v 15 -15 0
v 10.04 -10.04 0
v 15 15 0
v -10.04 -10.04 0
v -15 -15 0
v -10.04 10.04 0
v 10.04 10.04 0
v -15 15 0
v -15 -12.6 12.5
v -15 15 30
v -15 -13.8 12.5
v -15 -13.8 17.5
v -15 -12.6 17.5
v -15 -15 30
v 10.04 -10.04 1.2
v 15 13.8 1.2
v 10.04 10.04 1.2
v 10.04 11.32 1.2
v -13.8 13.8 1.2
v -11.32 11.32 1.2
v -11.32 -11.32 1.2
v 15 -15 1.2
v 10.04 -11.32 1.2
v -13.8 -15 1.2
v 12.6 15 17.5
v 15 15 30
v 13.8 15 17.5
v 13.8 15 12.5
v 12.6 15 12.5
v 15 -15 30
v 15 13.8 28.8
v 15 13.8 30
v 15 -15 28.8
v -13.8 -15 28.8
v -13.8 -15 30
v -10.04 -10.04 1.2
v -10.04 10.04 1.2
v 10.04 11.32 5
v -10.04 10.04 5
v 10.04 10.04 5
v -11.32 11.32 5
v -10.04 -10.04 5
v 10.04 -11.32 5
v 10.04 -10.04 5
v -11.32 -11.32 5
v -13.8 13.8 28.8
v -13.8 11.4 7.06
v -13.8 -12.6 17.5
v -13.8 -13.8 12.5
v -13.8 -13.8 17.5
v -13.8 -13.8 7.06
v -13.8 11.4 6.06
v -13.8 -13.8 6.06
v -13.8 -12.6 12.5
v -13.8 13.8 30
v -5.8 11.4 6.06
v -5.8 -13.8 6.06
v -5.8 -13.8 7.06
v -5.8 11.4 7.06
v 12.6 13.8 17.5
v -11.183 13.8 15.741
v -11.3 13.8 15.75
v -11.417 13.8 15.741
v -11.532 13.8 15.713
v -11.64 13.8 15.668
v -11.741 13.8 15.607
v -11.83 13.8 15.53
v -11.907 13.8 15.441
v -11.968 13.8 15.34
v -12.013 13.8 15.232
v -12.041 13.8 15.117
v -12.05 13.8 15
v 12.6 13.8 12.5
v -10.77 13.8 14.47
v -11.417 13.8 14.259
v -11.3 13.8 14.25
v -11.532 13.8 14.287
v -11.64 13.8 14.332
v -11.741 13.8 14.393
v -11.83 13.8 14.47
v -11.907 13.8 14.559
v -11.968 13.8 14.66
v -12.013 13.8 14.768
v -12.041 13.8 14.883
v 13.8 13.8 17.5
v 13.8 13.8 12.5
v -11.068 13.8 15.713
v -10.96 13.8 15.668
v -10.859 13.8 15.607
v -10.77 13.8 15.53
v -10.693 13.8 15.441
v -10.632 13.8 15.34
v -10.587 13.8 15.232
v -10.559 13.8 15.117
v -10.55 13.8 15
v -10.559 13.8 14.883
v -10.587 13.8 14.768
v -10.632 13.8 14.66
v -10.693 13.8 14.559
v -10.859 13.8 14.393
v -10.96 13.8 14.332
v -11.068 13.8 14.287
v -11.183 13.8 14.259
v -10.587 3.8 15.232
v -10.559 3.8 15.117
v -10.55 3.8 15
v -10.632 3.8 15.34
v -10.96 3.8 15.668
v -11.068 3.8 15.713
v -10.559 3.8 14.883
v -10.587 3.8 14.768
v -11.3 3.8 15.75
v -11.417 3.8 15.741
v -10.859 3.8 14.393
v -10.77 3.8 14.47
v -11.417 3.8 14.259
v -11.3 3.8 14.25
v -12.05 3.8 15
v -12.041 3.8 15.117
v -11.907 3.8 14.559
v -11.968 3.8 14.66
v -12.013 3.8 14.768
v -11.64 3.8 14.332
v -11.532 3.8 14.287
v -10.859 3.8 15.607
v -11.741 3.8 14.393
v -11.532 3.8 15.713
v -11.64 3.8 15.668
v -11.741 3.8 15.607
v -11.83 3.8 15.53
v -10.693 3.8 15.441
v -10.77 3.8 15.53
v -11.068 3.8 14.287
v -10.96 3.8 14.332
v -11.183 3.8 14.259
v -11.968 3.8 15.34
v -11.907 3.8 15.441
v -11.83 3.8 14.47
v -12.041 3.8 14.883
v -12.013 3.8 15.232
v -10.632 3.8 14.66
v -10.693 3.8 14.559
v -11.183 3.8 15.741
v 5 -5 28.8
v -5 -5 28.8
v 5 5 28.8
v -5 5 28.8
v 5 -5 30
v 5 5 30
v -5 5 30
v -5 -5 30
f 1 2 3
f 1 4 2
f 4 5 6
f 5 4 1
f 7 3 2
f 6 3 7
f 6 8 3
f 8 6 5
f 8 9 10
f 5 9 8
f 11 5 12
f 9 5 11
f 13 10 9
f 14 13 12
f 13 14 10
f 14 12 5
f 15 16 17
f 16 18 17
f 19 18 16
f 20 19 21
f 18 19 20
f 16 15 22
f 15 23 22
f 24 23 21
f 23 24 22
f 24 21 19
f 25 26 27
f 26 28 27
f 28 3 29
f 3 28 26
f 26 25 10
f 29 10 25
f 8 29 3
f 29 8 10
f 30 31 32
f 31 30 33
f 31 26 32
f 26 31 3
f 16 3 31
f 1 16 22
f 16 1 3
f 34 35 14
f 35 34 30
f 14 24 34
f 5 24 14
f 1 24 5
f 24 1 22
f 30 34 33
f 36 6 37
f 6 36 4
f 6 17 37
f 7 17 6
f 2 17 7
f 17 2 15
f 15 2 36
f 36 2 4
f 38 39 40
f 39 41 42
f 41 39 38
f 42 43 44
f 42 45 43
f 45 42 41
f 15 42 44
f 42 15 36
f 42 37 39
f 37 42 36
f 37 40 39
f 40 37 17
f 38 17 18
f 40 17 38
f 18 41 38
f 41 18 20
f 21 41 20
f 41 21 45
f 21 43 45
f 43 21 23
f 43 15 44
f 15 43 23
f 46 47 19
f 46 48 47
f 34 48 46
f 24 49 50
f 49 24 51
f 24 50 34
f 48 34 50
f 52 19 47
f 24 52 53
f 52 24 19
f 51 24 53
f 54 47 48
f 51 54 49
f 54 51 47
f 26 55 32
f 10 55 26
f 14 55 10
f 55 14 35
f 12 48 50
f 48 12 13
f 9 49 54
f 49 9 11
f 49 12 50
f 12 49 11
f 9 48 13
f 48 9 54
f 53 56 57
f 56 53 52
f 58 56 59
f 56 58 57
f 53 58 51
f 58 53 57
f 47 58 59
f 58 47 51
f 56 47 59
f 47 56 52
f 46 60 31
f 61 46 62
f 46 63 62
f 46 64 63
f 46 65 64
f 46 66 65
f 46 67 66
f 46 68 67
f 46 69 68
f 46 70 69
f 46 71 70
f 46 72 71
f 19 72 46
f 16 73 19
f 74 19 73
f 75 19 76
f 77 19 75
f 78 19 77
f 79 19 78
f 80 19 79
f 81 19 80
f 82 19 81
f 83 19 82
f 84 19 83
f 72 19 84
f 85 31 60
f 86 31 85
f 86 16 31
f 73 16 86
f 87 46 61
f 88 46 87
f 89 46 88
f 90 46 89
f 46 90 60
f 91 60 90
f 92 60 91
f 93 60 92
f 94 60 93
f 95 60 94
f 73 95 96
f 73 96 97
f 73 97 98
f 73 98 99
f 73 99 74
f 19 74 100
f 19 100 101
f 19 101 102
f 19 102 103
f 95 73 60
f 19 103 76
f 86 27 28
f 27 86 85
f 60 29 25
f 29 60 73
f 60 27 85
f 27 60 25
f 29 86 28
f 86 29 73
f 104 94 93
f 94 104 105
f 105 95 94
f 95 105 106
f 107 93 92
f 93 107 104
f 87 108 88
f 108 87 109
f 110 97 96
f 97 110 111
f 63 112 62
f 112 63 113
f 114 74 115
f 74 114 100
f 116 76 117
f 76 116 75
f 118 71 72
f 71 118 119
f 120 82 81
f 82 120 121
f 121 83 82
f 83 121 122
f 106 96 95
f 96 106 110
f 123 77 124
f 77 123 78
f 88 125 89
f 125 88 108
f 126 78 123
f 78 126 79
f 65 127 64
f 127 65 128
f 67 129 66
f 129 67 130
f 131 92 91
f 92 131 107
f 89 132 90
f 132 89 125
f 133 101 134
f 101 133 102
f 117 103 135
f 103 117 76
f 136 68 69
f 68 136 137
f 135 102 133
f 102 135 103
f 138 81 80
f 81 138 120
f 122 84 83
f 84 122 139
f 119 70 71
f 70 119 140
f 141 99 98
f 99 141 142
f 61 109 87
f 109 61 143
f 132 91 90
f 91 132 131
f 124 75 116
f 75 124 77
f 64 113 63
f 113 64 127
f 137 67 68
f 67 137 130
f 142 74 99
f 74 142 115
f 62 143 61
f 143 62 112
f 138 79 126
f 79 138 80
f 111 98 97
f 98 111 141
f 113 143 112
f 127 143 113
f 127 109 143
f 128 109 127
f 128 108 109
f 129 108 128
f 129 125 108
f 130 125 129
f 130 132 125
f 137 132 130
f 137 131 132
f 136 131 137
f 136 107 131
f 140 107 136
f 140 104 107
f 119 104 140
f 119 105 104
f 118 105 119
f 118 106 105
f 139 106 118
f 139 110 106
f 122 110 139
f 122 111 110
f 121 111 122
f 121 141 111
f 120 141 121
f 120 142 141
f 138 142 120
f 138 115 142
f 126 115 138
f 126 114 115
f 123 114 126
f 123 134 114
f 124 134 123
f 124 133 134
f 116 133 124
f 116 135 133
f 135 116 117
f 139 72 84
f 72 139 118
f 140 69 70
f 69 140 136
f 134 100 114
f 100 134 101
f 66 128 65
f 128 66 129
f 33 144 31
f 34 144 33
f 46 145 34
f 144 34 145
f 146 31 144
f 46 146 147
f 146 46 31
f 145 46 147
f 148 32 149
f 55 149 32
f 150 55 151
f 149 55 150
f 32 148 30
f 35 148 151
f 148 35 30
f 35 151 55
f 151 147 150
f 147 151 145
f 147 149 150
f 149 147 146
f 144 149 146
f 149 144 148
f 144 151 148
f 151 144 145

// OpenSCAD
// ============================================================
// 하우징 Peltier 30x30 - box 조립 (Peltier 면 + 립이 있는 면 + +Y쪽 면 + +Z쪽 면)
// Peltier 면(바닥): housing_peltier_box_v2에서 가져옴. 전체 크기 25x25 -> 30x30으로 변경,
// 사각 링 안쪽 20.04x20.04는 그대로 유지 (ring_outer는 그대로라 이제 하우징 안쪽 경계와
// 떨어져 있음).
// 립이 있는 면(peltier_30_v1_face): Peltier 면의 -X쪽 가장자리에 부착, 평면 기준 90도 회전.
// 이 회전으로 로컬 X -> world Z(높이), 로컬 Y -> world Y(깊이, 부호 반전),
// 로컬 Z(립 돌출) -> world +X 로 대응됨. 립 Z방향 돌출 높이 8mm.
//
// closure1/closure2는 housing_peltier_30_closure1_v1.scad / housing_peltier_30_closure2_v1.scad로 분리됨.
// ============================================================

// ---------------- Peltier 면 (바닥, 30x30) ----------------
module peltier_v2_face() {
    face_size = 30;   // 면의 가로/세로 (정사각형, 25 -> 30으로 변경)
    housing_t = 1.2;  // 하우징 두께 (사방 테두리)

    frame_w = 1.28;   // 사각 링(프레임) 벽 두께 (변경 없음)
    sq_size = 20.08;  // 프레임 안쪽 정사각형 (Peltier 안착 공간, 관통 구멍) - 20.04에서 0.04mm 증가
    ring_z  = 3.8;    // 사각 링 Z방향 돌출 높이

    inner_size = face_size - 2 * housing_t; // 27.6mm (하우징 안쪽 치수)
    ring_outer = sq_size + 2 * frame_w;     // 22.64mm (sq_size와 함께 0.04mm 증가, frame_w는 그대로)

    echo("[Peltier_v2] ring_outer =", ring_outer, " sq_size =", sq_size);

    // 바닥판 (실제 3D, 두께 1.2mm). 사각 링 안쪽(20.08x20.08)은 관통 구멍.
    color("gray")
        difference() {
            linear_extrude(height = housing_t)
                square([face_size, face_size], center = true);
            translate([0, 0, -0.1])
                linear_extrude(height = housing_t + 0.2)
                    square([sq_size, sq_size], center = true);
        }

    // 사각 링(프레임): 중앙에 20.08x20.08 정사각형 안착 공간이 생김.
    // 바닥판 위로 ring_z만큼 돌출. X축 양수방향 벽은 제거되어 열려있음.
    color("SteelBlue")
        translate([0, 0, housing_t])
            linear_extrude(height = ring_z)
                difference() {
                    difference() {
                        square([ring_outer, ring_outer], center = true);
                        square([sq_size, sq_size], center = true);
                    }
                    // X축 양수방향 벽 제거
                    translate([sq_size / 2, -ring_outer / 2 - 0.1])
                        square([ring_outer / 2 - sq_size / 2 + 0.2, ring_outer + 0.2]);
                }
}

// ---------------- 립이 있는 면 (-X쪽 면) ----------------
module peltier_30_v1_face() {
    face_size = 30;   // 면의 가로/세로 (정사각형)
    housing_t = 1.2;  // 하우징 두께 (위/오른쪽 테두리)

    rib_w   = 1;      // 립 두께 (X방향)
    rib_len = 25.2;   // 립 길이 (Y방향)
    rib_z   = 8;      // 립 Z방향 돌출 높이

    left_margin  = 4.86;  // 안쪽 왼쪽 모서리 - 립 왼쪽 면 거리
    right_margin = 21.74; // 립 오른쪽 면 - 안쪽 오른쪽 모서리 거리

    // world Y축 음수방향 모서리에서 1.2mm 떨어진 5x1.2mm 관통 구멍 (housing_peltier_box_v2의
    // peltier_left_v2_face와 동일한 스펙)
    hole_w = 5;   // X방향
    hole_h = 1.2; // Y방향
    hole_gap = 1.2; // world -Y쪽 모서리 - 구멍 사이 거리

    // Y축: 립 위쪽 끝이 안쪽 위쪽 모서리(위쪽 테두리 안쪽)에 닿음
    y_inner_top    = face_size / 2 - housing_t;  // 안쪽 위쪽 테두리 (13.8)
    y_inner_bottom = -face_size / 2 + housing_t; // 안쪽 아래쪽 테두리 (-13.8)
    rib_bottom     = y_inner_top - rib_len;      // 립 아래쪽 끝
    gap_bottom_check = rib_bottom - y_inner_bottom; // 2.4mm 이어야 함

    rib_center_y = (y_inner_top + rib_bottom) / 2;
    rib_center_x = -face_size / 2 + housing_t + left_margin + rib_w / 2;
    x_total_check = left_margin + rib_w + right_margin; // 27.6mm 이어야 함

    echo("[Peltier30_v1] gap_bottom check =", gap_bottom_check, " (should be 2.4)");
    echo("[Peltier30_v1] x_total check =", x_total_check, " (should be", face_size - 2 * housing_t, ")");

    // 바닥판 (실제 3D, 두께 1.2mm). world Y축 음수방향 모서리에서 1.2mm 떨어진
    // 5x1.2mm 관통 구멍. 이 면은 world_y = -local_y로 매핑되므로(평면 기준 90도 회전),
    // world -Y 모서리는 로컬 +Y 모서리에 해당함.
    color("gray")
        difference() {
            linear_extrude(height = housing_t)
                square([face_size, face_size], center = true);
            translate([-hole_w / 2, face_size / 2 - hole_gap - hole_h, -0.1])
                cube([hole_w, hole_h, housing_t + 0.2]);
        }

    // 립 (실제 3D, 바닥판 위에 Z 깊이 rib_z 추가)
    color("SteelBlue")
        translate([0, 0, housing_t])
            linear_extrude(height = rib_z)
                translate([rib_center_x, rib_center_y])
                    square([rib_w, rib_len], center = true);
}

// ---------------- +Y쪽 면 (X축 양수방향 모서리에 구멍) ----------------
// 크기와 두께는 Peltier 면 / 립이 있는 면과 동일 (30x30mm, 1.2mm 두께).
module peltier30_y_pos_face() {
    face_size = 30;
    housing_t = 1.2;

    // X축 양수방향 모서리에서 X축 음수 방향으로 1.2mm 떨어진 5x1.2mm 관통 구멍
    hole_w = 1.2; // X방향
    hole_h = 5;   // Y방향
    hole_gap = 1.2; // +X쪽 모서리 - 구멍 사이 거리

    color("gray")
        difference() {
            linear_extrude(height = housing_t)
                square([face_size, face_size], center = true);
            translate([face_size / 2 - hole_gap - hole_w, -hole_h / 2, -0.1])
                cube([hole_w, hole_h, housing_t + 0.2]);
        }

    // 원기둥: 지름 1.5mm, 길이 10mm. -X쪽 면(립 있는 면)의 안쪽 면 기준 2.5mm 떨어진 위치.
    // world -Y 방향(캐비티 쪽)으로 돌출, 높이는 벽 중앙.
    pin_d = 1.5;
    pin_len = 10;
    pin_x = -face_size / 2 + housing_t + 2.5; // -11.3

    echo("[Peltier30YPos_v1] pin_x =", pin_x);

    color("SteelBlue")
        translate([pin_x, 0, housing_t])
            cylinder(d = pin_d, h = pin_len, $fn = 40);
}

// ---------------- +Z쪽 면 (윗면, 정가운데 10x10 정사각형 구멍) ----------------
// 크기와 두께는 Peltier 면 / 립이 있는 면과 동일 (30x30mm, 1.2mm 두께).
module peltier30_top_face() {
    face_size = 30;
    housing_t = 1.2;
    sq_size   = 10; // 정가운데 정사각형 구멍 한 변

    color("gray")
        difference() {
            linear_extrude(height = housing_t)
                square([face_size, face_size], center = true);
            translate([0, 0, -0.1])
                linear_extrude(height = housing_t + 0.2)
                    square([sq_size, sq_size], center = true);
        }
}

// ---------------- 조립 ----------------
peltier_v2_face();

// 립이 있는 면을 Peltier 면의 -X쪽 가장자리(x=-15)에 수직으로 세움.
// 평면 기준 90도 회전하여 로컬 X -> world Z(높이), 로컬 Y -> world Y(깊이, 부호 반전),
// 로컬 Z(립 돌출) -> world +X 로 대응됨.
translate([-15, 0, 15])
    rotate([0, 0, 90])
        rotate([90, 0, 0])
            rotate([0, 0, 90])
                peltier_30_v1_face();

// +Y쪽 면을 Peltier 면의 +Y쪽 가장자리(y=15)에 수직으로 세움.
translate([0, 15, 15])
    rotate([90, 0, 0])
        peltier30_y_pos_face();

// +Z쪽 면(윗면)을 Peltier 면 위(z=28.8~30)에 평행하게 덮음.
translate([0, 0, 28.8])
    peltier30_top_face();
